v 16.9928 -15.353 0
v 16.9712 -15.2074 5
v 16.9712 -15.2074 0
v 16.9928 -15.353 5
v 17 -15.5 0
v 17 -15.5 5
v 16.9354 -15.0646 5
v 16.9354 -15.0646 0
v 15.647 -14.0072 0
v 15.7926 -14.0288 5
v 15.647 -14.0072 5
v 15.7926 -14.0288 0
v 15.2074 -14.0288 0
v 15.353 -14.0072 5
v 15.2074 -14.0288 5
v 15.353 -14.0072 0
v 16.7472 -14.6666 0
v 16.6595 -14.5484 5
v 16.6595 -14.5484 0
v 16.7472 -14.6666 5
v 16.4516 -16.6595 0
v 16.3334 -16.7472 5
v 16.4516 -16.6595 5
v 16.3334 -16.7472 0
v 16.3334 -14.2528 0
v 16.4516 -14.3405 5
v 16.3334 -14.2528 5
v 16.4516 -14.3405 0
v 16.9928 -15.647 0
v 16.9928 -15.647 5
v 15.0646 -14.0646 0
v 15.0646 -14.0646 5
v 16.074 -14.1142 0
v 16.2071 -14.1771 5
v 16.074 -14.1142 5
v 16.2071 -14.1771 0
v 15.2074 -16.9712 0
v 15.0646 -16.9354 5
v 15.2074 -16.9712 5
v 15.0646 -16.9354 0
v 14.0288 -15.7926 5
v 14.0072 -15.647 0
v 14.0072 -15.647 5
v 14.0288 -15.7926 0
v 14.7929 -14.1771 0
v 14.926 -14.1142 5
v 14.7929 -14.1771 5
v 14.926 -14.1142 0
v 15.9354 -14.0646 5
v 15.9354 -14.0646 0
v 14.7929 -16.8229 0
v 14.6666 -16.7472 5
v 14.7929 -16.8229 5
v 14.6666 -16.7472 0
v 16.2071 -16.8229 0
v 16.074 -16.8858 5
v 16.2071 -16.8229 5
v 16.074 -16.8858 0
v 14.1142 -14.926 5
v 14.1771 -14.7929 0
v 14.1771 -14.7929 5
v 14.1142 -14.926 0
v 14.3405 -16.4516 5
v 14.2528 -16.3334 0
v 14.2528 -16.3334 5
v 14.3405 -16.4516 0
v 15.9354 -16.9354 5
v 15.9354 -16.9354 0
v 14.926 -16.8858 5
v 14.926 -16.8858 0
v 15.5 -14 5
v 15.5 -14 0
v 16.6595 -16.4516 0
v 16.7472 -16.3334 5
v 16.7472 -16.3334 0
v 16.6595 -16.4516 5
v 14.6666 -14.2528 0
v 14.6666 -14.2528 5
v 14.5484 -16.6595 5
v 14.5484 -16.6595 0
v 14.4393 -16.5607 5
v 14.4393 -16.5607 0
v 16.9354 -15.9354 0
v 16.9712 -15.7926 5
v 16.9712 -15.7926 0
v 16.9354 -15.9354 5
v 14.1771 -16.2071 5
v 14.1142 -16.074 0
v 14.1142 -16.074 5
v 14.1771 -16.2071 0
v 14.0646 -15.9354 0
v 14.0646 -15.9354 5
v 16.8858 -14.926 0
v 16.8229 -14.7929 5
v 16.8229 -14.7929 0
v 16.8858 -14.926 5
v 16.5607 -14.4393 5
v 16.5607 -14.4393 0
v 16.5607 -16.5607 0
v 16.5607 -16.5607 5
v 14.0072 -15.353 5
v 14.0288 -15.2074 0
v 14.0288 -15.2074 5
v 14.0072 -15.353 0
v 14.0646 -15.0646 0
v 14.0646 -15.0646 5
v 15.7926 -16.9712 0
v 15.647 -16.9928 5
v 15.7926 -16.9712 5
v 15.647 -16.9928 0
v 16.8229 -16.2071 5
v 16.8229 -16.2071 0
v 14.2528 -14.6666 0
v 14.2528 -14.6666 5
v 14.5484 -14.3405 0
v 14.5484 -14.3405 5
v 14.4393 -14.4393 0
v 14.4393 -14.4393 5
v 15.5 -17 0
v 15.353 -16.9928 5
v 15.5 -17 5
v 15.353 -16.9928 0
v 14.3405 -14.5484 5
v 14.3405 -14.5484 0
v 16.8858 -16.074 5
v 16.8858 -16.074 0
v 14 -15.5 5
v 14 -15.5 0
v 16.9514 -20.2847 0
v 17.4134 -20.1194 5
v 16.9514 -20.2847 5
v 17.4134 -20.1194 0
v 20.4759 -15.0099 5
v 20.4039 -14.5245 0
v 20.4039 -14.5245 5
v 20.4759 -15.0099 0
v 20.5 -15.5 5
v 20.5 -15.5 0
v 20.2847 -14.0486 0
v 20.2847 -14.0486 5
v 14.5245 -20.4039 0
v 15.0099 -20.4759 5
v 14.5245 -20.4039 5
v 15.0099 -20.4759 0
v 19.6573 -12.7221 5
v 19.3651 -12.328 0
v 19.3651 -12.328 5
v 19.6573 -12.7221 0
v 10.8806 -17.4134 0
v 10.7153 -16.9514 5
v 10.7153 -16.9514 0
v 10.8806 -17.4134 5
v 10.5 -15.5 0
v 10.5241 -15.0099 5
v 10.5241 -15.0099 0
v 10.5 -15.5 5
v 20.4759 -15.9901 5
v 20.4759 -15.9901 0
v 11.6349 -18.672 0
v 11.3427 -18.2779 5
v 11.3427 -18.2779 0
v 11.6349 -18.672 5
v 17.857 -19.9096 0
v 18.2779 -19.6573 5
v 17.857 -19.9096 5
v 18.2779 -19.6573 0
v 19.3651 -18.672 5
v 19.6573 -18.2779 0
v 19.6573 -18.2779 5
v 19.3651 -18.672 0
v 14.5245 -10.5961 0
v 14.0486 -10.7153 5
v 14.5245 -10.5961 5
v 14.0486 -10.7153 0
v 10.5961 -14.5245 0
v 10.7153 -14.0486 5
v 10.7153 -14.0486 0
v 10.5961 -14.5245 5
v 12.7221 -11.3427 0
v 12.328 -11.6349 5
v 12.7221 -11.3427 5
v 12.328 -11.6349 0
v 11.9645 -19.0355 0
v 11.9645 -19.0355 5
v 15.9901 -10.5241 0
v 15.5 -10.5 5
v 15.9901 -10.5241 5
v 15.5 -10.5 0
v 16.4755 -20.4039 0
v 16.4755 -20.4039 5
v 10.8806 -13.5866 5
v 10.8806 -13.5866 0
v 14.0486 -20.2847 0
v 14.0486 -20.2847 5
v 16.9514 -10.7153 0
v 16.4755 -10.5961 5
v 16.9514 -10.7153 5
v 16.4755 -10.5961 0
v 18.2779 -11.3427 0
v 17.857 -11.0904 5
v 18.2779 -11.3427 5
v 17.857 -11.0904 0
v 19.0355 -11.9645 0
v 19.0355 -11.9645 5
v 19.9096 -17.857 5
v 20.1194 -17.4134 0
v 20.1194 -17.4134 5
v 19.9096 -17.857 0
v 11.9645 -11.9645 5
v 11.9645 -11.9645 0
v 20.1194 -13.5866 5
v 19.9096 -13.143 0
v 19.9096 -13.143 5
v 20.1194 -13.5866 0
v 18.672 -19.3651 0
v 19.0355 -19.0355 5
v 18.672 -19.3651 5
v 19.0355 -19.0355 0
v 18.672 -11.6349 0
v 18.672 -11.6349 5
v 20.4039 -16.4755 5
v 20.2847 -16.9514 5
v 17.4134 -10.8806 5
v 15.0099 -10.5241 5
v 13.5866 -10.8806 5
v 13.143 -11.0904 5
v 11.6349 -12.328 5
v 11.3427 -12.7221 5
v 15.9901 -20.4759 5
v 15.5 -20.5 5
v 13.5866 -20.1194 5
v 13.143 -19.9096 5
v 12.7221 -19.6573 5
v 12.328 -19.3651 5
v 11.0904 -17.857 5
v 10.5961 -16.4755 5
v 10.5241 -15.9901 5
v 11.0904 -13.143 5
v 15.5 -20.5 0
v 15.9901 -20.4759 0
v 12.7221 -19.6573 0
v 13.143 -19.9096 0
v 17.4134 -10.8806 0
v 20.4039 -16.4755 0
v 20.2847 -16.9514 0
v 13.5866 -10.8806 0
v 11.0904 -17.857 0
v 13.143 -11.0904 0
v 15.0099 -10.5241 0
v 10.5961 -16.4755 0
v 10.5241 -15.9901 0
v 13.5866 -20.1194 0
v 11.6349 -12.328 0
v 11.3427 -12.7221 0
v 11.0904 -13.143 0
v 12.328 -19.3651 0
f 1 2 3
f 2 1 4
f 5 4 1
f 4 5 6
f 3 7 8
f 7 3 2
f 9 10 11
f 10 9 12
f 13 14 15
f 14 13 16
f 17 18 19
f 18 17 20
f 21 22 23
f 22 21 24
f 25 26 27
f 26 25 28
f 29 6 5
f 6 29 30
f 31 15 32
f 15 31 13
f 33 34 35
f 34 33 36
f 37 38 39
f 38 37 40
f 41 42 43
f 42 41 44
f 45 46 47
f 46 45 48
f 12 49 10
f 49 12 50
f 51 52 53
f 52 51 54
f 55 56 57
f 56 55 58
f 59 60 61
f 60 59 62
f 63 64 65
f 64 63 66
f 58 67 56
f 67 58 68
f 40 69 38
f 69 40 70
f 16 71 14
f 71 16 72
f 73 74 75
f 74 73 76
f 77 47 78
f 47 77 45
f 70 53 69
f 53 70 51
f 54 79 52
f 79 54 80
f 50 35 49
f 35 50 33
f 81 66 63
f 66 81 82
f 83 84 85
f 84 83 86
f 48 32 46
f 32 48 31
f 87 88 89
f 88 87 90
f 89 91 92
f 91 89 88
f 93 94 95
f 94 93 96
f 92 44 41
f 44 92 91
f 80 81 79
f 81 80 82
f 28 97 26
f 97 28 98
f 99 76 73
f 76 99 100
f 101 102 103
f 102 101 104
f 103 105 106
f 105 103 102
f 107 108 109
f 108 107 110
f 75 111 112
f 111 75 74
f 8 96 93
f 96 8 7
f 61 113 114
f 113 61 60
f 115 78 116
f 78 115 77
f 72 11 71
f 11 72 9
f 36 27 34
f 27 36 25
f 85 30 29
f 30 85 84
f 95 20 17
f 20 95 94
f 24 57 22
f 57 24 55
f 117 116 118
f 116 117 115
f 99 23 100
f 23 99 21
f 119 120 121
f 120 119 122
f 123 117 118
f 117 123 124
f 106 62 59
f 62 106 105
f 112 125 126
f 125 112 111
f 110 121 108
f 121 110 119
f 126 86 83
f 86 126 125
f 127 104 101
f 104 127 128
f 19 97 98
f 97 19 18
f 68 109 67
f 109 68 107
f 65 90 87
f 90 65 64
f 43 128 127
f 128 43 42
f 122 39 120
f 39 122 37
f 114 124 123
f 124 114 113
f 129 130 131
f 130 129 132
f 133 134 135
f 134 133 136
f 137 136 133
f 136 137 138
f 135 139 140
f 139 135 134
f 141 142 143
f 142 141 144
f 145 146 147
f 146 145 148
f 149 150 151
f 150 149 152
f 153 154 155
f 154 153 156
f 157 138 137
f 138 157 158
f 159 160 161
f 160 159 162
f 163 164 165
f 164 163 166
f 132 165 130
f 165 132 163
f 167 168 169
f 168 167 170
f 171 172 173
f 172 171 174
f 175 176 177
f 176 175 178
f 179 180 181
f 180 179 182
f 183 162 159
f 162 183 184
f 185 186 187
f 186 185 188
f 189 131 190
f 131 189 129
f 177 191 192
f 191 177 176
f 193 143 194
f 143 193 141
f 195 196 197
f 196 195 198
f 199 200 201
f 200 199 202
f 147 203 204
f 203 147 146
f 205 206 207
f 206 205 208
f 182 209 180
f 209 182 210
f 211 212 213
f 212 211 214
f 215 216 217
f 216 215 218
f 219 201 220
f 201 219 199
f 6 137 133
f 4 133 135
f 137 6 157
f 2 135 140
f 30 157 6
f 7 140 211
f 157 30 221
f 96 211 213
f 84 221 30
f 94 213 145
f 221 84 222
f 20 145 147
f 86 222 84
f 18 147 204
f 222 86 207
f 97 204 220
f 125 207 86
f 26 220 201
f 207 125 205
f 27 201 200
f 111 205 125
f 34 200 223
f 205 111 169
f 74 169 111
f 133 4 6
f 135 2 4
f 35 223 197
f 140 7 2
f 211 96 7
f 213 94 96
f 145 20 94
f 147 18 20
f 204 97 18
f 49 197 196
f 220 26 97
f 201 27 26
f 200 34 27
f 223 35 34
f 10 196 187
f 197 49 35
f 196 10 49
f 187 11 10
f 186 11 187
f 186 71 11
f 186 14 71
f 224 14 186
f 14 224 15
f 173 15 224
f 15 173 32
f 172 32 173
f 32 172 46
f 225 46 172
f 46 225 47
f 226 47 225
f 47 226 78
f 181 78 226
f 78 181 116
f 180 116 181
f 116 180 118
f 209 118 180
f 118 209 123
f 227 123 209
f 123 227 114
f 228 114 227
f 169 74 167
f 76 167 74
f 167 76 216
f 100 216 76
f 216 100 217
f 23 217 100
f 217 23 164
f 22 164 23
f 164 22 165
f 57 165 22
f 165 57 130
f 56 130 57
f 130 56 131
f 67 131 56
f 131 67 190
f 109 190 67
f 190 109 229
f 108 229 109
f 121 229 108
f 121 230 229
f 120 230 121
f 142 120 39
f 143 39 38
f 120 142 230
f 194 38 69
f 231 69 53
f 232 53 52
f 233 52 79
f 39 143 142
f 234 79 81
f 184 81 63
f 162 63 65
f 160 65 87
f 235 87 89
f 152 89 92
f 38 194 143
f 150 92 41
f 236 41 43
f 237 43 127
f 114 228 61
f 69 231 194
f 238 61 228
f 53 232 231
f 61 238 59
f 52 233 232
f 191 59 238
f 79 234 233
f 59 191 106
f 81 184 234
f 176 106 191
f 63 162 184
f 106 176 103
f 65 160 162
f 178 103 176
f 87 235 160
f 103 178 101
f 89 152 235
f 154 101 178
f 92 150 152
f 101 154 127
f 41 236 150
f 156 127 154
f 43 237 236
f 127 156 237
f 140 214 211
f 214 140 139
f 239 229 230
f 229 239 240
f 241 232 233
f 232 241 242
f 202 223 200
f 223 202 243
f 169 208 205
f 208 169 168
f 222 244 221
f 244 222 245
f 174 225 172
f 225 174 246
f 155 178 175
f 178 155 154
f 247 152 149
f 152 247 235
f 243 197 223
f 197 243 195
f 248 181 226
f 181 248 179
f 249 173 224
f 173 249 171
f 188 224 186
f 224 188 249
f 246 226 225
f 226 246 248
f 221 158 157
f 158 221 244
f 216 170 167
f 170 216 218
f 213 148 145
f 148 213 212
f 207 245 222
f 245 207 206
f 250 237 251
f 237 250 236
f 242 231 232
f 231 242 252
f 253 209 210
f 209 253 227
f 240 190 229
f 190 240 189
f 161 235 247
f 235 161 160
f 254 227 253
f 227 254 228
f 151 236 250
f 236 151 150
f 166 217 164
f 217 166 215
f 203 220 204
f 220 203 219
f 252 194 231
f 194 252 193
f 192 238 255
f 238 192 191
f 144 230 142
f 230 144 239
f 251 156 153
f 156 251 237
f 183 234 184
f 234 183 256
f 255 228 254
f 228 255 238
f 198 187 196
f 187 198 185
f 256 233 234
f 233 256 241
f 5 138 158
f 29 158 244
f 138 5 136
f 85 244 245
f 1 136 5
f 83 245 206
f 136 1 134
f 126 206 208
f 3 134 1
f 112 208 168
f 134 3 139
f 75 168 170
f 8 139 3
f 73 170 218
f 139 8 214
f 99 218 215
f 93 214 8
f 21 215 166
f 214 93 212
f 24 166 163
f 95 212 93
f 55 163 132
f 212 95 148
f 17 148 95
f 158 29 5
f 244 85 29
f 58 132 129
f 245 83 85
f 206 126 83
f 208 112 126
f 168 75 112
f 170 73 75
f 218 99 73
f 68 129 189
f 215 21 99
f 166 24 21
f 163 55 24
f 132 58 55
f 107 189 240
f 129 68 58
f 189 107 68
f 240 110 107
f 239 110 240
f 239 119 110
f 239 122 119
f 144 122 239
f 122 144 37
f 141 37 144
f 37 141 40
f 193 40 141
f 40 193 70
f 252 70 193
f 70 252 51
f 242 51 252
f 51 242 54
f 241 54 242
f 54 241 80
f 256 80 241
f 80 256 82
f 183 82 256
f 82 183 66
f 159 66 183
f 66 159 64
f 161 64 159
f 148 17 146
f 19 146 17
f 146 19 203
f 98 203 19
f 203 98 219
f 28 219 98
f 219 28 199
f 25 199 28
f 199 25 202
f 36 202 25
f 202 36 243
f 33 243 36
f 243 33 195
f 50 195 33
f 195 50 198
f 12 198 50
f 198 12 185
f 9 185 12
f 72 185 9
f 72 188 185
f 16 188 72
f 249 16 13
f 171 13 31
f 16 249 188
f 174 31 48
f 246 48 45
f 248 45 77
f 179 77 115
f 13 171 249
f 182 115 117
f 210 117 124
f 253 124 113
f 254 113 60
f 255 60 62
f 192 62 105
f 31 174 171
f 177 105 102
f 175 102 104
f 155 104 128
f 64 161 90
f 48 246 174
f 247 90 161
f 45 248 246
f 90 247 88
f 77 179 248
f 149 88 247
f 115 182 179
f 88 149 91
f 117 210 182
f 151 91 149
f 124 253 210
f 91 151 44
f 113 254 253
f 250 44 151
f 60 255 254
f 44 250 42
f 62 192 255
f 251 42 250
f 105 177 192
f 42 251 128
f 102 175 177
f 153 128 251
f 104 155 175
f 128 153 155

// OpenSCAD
x_filament = 4.4;
z_filament = 9.5;
x_idler = 10;

module mk8() {
	translate([0,0,z_filament])
	rotate_extrude(convexity = 10, $fn = 100) 
	import (file = "MyExtruder_v1.2.dxf", layer = "mk8");
}

module base() {

difference() {

	union() {
		
		// Import the 2D design
		linear_extrude(height = 3, center = false, convexity = 10)
  			import (file = "MyExtruder_v1.2.dxf", layer = "base", $fn=64);
		linear_extrude(height = 14, center = false, convexity = 10)
   			import (file = "MyExtruder_v1.2.dxf", layer = "base_top", $fn=64);
		
		// Support for the idler hinge
		translate([15.5,-15.5,0]) {
			cylinder(r=5, h=5, $fn=64);
		}
	}

	union() {
		
		// Import the 2D design
		translate([0,0,-1]) linear_extrude(height = 16, center = false, convexity = 10)
  			import (file = "MyExtruder_v1.2.dxf", layer = "base_hole", $fn=64);

		translate([0,0,z_filament])
		rotate_extrude(convexity = 10, $fn = 100) 
		import (file = "MyExtruder_v1.2.dxf", layer = "mk8ext");
		
		// Hole for the motor screws
		translate([15.5,-15.5,-1]) cylinder(r=1.5, h=16, $fn=64);
		translate([-15.5,-15.5,-1]) cylinder(r=1.5, h=16, $fn=64);
		translate([15.5,15.5,-1]) cylinder(r=1.5, h=16, $fn=64);
		translate([-15.5,15.5,-1]) cylinder(r=1.5, h=16, $fn=64);

		// motor hole 
		translate([0,0,-1]) cylinder(r=11.1, h=3, $fn=64);

		// Hole for the filament
		translate([x_filament,35,z_filament]) rotate([90,0,0]) cylinder(r=1.2, h=70, $fn=64);
		translate([x_filament,35-50,z_filament]) rotate([90,0,0]) cylinder(r=4.5/2, h=2+13, $fn=64);
                for(i=[0:10]){
		translate([x_filament,35-54,z_filament+(i*0.5)]) rotate([90,0,0]) cylinder(r=4.5/2, h=2+13, $fn=64);
  	 	}
		// Hole for the spring nut
		translate([6,21,9.5]) rotate([0,90,0]) cylinder(r=2, h=12, $fn=64);			
		translate([7.8,17.4,15.5]) rotate([0,90,0]) cube([10,7.2,3.2]);	

		// Hole for the hot-end
		translate([x_filament,-21,z_filament]) rotate([90,0,0]) cylinder(r=8.05, h=4.1, $fn=64);
		translate([x_filament,-25,z_filament]) rotate([90,0,0]) cylinder(r=6.05, h=6, $fn=64);
		translate([x_filament-8.05,-21,z_filament]) rotate([90,0,0]) cube([16.1, 10, 4.1]);
		translate([x_filament-6.05,-25,z_filament]) rotate([90,0,0]) cube([12.1, 10, 6]);

		// Holes for the hod-end mount screws
		translate([15.5,-26,-1]) { 
				cylinder(r=2.8/2, h=16, $fn=64);
				//#cylinder(r=3.3, h=6, $fn=6);
		}
		translate([-15.5+8,-26,-1]) {
			cylinder(r=2.8/2, h=16, $fn=64);
			//cylinder(r=3.3, h=6, $fn=6);
		}

		// Hole for the fan mount
		translate([-17.5,-28+3.6,10]) rotate([0,90,0]) #cylinder(r=3.8/2, h=8, $fn=64);	
		//translate([-13.5,-28,16]) rotate([0,90,0]) cube([10,7.2,3.2]);	

	}

}
	// Import the 2D design, Add some support
		translate([0,0,0]) linear_extrude(height = 2, center = false, convexity = 10)
  			import (file = "MyExtruder_v1.2.dxf", layer = "support", $fn=64);

}

module hot_end_mount() {
difference() {

	union() {
		// Import the 2D design
		translate([0,0,14]) linear_extrude(height = 5, center = false, convexity = 10)
  			import (file = "MyExtruder_v1.2.dxf", layer = "hot_mount", $fn=64);

	}

	union() {
		
		// Hole for the hot-end
		translate([4,-20.9,z_filament-0.1]) rotate([90,0,0]) cylinder(r=8.05, h=4.2, $fn=64);
		translate([4,-25,z_filament-0.1]) rotate([90,0,0]) cylinder(r=6.05, h=6.1, $fn=64);

		translate([-25,-50, 0]) cube([50,50,12]);

		// Holes for the hod-end mount screws
		translate([15.5,-26,10]) { 
				cylinder(r=1.5, h=16, $fn=64);
				//cylinder(r=3.3, h=4, $fn=6);
		}
		translate([-15.5+8,-26,10]) {
			cylinder(r=1.5, h=16, $fn=64);
			//cylinder(r=3.3, h=4, $fn=6);
		}

	}

}

}


module idler() {

difference() {

	union() {
		
		// Import the 2D design
		linear_extrude(height = 2, center = false, convexity = 10)
  			import (file = "MyExtruder_v1.2.dxf", layer = "idler_base", $fn=64);
		linear_extrude(height = 9, center = false, convexity = 10)
   			import (file = "MyExtruder_v1.2.dxf", layer = "idler", $fn=64);
		
		// Support for the bearing
		translate([x_idler,0,0]) {
			cylinder(r=2.32, h=9, $fn=64);
			cylinder(r=3.5, h=2.2, $fn=64);
		}
	}

	union() {
		
		// Hole for the bearing screw (to be taped M3)
		//translate([x_idler,0,-1]) cylinder(r=1.47, h=12, $fn=64);

		// Hole for the hinge screw
		translate([15.5,-15.5,-1]) cylinder(r=1.5, h=12, $fn=64);

		// Hole for the filament
		translate([15,22,z_filament-5]) rotate([0,90,0]) cylinder(r=2, h=12, $fn=64);	
		translate([15,20,z_filament-5]) rotate([0,90,0]) cylinder(r=2, h=12, $fn=64);	
		translate([15,20,z_filament-3]) rotate([0,90,0]) cube([4,2,12]);	

		// Hole for the spring 
		translate([5,12,4.5]) rotate([90,0,0]) cylinder(r=1.2, h=12, $fn=64);	
		translate([0,12,3.3]) rotate([90,0,0]) cube([5,2.4,12]);	
	}

}

}
//mk8();
base();
//translate([0,0,1]) rotate([0, 180, 0]) hot_end_mount();
//translate([0,0,2])hot_end_mount();
//translate([0,0,5]) idler();
//%translate([x_filament,35,z_filament]) rotate([90,0,0]) cylinder(r=1.75/2, h=70, $fn=64);
